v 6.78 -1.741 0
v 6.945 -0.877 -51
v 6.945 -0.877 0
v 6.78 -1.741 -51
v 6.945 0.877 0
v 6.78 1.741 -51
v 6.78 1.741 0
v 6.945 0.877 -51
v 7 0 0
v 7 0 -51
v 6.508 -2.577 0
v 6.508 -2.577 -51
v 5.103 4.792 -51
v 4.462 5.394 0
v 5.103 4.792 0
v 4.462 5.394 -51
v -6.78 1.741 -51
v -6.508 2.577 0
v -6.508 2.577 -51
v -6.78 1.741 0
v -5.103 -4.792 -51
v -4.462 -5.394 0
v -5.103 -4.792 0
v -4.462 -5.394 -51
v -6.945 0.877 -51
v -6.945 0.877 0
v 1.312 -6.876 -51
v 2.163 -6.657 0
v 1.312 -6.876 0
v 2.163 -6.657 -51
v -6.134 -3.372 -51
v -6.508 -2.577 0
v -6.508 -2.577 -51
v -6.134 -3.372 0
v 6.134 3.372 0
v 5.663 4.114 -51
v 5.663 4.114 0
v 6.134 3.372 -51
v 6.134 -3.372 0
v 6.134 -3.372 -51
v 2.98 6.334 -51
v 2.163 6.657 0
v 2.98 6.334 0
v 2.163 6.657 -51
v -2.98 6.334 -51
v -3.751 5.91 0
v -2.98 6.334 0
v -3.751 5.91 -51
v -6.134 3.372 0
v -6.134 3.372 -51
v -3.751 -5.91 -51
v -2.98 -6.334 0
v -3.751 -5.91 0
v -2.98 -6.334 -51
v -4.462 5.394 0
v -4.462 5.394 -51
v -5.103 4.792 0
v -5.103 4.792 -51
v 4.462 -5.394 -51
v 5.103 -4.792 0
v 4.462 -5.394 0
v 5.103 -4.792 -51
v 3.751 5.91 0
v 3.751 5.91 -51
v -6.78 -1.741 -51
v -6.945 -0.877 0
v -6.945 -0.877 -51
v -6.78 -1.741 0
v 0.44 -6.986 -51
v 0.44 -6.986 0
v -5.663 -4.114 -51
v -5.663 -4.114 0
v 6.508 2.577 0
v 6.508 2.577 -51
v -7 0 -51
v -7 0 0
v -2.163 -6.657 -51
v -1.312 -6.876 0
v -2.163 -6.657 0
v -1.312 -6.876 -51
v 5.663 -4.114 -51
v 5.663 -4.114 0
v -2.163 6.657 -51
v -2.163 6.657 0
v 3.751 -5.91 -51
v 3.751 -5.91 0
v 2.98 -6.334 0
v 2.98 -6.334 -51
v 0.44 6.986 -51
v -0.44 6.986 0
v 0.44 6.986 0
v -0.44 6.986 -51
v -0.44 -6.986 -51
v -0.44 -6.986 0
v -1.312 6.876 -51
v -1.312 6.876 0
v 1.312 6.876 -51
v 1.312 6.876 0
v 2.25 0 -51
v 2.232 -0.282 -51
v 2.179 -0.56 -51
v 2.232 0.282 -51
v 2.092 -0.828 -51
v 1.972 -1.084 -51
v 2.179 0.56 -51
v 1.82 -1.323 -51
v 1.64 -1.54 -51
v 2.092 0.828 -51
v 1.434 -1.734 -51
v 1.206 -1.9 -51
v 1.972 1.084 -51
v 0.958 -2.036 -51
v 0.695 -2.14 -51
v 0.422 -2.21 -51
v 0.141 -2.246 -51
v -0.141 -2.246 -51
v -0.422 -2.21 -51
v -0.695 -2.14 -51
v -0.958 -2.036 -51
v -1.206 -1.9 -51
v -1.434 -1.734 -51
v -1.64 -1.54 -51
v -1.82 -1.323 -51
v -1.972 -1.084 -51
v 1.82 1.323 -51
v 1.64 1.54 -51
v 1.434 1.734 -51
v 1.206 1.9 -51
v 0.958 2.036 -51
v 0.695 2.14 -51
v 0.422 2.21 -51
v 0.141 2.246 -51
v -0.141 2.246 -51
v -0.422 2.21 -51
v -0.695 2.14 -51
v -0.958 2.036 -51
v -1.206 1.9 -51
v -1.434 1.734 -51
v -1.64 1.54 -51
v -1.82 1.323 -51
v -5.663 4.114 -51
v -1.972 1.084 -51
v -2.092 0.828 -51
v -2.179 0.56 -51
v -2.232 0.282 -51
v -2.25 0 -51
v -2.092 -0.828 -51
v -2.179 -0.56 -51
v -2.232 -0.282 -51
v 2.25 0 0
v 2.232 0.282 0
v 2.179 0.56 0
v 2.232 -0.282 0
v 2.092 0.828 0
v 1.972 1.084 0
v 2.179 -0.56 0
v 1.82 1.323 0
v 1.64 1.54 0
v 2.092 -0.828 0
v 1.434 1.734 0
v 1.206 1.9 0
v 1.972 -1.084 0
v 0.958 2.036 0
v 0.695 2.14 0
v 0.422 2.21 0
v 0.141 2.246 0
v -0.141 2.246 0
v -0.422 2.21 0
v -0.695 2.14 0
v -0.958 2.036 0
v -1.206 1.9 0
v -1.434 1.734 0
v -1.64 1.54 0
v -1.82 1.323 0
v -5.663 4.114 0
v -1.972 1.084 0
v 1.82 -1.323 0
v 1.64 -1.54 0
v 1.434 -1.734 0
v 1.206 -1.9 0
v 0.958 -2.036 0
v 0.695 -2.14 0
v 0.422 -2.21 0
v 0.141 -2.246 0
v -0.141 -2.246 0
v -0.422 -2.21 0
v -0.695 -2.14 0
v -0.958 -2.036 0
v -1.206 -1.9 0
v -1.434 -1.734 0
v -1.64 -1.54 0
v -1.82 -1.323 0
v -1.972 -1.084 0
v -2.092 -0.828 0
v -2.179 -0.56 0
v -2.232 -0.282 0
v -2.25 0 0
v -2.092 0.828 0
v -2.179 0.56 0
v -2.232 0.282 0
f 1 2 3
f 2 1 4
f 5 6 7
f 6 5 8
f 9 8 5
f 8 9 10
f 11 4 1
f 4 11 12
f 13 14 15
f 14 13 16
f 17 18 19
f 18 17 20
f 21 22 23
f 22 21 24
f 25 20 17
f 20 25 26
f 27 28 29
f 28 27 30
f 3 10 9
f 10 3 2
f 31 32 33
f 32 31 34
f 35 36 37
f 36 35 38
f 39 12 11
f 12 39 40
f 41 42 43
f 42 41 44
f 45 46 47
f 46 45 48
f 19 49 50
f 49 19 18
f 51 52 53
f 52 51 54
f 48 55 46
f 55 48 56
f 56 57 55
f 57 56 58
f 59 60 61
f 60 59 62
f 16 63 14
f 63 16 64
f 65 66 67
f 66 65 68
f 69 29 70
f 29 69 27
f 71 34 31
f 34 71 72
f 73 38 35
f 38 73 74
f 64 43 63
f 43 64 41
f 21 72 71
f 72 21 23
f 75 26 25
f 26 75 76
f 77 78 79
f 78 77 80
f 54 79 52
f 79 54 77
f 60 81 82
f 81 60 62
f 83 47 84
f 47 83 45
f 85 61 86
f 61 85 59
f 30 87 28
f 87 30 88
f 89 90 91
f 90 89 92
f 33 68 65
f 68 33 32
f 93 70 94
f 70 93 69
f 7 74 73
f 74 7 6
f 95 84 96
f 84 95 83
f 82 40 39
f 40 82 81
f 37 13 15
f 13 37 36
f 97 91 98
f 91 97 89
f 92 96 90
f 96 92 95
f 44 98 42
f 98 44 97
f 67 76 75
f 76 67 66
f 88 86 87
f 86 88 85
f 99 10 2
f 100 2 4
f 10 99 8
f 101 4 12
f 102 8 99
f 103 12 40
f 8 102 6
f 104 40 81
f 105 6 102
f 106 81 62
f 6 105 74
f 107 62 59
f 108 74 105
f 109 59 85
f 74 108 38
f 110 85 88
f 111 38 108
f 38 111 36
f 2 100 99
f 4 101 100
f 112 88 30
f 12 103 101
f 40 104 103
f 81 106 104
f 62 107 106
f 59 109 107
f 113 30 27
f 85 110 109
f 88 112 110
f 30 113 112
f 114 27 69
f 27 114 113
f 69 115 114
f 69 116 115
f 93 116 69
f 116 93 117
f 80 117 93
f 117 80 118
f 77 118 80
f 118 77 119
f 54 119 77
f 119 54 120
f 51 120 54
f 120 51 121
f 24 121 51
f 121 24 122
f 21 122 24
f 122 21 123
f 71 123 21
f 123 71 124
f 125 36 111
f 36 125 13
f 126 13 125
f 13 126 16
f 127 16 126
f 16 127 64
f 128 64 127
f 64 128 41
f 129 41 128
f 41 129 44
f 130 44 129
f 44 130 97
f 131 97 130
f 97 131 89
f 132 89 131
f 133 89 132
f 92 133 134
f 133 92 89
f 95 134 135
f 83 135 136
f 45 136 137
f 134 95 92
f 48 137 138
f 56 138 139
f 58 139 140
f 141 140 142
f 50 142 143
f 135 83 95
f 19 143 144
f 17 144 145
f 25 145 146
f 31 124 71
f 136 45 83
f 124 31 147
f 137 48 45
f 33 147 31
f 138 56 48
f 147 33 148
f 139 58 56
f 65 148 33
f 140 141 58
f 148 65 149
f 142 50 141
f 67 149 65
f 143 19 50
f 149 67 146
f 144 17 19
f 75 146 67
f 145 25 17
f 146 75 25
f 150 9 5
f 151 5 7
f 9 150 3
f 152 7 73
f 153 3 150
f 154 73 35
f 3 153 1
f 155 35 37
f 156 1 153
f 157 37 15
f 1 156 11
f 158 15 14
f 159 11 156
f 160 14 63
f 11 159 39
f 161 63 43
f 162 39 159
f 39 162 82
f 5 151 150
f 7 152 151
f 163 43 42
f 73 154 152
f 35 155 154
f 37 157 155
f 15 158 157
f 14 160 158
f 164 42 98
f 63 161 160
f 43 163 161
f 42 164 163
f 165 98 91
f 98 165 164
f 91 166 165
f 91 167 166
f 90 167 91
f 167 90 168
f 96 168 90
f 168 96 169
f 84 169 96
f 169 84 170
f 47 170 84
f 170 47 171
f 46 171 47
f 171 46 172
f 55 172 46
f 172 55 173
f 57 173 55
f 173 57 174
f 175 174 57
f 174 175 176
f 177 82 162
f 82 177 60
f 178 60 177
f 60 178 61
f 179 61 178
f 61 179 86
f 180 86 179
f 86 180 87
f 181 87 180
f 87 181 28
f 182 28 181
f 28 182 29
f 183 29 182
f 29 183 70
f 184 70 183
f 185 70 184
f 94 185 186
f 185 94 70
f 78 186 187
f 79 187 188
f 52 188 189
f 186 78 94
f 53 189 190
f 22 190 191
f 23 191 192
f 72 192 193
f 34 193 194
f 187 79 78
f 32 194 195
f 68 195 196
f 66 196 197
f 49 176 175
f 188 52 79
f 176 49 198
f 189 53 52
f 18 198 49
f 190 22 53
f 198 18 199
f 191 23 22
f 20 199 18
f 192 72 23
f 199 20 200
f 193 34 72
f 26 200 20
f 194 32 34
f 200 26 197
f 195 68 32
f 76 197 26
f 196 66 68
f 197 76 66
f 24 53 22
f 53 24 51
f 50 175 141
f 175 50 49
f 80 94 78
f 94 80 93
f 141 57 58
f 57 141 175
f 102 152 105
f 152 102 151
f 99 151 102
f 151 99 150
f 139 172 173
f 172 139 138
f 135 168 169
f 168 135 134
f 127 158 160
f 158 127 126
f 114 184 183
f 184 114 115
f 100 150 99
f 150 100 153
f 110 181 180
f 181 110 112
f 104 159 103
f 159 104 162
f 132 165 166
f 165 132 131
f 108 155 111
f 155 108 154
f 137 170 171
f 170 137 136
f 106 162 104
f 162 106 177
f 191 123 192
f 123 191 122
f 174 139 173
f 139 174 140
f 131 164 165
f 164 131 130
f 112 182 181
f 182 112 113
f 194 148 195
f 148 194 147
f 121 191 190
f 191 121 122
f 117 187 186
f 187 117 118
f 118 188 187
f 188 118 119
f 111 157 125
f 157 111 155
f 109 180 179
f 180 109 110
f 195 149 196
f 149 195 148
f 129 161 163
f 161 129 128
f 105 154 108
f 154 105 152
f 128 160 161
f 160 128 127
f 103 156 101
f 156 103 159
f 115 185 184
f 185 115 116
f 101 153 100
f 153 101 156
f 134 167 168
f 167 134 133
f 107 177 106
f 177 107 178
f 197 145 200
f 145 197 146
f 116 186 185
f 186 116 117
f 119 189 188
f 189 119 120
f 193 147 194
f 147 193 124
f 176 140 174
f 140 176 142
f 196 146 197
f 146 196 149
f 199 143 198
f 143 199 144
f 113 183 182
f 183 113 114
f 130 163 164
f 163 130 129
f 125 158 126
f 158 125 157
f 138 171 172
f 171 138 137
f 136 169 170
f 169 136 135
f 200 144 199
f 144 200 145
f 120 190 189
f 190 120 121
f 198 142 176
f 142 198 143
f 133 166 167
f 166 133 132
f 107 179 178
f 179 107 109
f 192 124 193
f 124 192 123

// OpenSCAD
$fn = 50;


difference() {
	union() {
		translate(v = [0, 0, -51.0000000000]) {
			cylinder(h = 51, r = 7.0000000000);
		}
	}
	union() {
		#translate(v = [0, 0, -51]) {
			cylinder(h = 51, r = 2.2500000000);
		}
	}
}
